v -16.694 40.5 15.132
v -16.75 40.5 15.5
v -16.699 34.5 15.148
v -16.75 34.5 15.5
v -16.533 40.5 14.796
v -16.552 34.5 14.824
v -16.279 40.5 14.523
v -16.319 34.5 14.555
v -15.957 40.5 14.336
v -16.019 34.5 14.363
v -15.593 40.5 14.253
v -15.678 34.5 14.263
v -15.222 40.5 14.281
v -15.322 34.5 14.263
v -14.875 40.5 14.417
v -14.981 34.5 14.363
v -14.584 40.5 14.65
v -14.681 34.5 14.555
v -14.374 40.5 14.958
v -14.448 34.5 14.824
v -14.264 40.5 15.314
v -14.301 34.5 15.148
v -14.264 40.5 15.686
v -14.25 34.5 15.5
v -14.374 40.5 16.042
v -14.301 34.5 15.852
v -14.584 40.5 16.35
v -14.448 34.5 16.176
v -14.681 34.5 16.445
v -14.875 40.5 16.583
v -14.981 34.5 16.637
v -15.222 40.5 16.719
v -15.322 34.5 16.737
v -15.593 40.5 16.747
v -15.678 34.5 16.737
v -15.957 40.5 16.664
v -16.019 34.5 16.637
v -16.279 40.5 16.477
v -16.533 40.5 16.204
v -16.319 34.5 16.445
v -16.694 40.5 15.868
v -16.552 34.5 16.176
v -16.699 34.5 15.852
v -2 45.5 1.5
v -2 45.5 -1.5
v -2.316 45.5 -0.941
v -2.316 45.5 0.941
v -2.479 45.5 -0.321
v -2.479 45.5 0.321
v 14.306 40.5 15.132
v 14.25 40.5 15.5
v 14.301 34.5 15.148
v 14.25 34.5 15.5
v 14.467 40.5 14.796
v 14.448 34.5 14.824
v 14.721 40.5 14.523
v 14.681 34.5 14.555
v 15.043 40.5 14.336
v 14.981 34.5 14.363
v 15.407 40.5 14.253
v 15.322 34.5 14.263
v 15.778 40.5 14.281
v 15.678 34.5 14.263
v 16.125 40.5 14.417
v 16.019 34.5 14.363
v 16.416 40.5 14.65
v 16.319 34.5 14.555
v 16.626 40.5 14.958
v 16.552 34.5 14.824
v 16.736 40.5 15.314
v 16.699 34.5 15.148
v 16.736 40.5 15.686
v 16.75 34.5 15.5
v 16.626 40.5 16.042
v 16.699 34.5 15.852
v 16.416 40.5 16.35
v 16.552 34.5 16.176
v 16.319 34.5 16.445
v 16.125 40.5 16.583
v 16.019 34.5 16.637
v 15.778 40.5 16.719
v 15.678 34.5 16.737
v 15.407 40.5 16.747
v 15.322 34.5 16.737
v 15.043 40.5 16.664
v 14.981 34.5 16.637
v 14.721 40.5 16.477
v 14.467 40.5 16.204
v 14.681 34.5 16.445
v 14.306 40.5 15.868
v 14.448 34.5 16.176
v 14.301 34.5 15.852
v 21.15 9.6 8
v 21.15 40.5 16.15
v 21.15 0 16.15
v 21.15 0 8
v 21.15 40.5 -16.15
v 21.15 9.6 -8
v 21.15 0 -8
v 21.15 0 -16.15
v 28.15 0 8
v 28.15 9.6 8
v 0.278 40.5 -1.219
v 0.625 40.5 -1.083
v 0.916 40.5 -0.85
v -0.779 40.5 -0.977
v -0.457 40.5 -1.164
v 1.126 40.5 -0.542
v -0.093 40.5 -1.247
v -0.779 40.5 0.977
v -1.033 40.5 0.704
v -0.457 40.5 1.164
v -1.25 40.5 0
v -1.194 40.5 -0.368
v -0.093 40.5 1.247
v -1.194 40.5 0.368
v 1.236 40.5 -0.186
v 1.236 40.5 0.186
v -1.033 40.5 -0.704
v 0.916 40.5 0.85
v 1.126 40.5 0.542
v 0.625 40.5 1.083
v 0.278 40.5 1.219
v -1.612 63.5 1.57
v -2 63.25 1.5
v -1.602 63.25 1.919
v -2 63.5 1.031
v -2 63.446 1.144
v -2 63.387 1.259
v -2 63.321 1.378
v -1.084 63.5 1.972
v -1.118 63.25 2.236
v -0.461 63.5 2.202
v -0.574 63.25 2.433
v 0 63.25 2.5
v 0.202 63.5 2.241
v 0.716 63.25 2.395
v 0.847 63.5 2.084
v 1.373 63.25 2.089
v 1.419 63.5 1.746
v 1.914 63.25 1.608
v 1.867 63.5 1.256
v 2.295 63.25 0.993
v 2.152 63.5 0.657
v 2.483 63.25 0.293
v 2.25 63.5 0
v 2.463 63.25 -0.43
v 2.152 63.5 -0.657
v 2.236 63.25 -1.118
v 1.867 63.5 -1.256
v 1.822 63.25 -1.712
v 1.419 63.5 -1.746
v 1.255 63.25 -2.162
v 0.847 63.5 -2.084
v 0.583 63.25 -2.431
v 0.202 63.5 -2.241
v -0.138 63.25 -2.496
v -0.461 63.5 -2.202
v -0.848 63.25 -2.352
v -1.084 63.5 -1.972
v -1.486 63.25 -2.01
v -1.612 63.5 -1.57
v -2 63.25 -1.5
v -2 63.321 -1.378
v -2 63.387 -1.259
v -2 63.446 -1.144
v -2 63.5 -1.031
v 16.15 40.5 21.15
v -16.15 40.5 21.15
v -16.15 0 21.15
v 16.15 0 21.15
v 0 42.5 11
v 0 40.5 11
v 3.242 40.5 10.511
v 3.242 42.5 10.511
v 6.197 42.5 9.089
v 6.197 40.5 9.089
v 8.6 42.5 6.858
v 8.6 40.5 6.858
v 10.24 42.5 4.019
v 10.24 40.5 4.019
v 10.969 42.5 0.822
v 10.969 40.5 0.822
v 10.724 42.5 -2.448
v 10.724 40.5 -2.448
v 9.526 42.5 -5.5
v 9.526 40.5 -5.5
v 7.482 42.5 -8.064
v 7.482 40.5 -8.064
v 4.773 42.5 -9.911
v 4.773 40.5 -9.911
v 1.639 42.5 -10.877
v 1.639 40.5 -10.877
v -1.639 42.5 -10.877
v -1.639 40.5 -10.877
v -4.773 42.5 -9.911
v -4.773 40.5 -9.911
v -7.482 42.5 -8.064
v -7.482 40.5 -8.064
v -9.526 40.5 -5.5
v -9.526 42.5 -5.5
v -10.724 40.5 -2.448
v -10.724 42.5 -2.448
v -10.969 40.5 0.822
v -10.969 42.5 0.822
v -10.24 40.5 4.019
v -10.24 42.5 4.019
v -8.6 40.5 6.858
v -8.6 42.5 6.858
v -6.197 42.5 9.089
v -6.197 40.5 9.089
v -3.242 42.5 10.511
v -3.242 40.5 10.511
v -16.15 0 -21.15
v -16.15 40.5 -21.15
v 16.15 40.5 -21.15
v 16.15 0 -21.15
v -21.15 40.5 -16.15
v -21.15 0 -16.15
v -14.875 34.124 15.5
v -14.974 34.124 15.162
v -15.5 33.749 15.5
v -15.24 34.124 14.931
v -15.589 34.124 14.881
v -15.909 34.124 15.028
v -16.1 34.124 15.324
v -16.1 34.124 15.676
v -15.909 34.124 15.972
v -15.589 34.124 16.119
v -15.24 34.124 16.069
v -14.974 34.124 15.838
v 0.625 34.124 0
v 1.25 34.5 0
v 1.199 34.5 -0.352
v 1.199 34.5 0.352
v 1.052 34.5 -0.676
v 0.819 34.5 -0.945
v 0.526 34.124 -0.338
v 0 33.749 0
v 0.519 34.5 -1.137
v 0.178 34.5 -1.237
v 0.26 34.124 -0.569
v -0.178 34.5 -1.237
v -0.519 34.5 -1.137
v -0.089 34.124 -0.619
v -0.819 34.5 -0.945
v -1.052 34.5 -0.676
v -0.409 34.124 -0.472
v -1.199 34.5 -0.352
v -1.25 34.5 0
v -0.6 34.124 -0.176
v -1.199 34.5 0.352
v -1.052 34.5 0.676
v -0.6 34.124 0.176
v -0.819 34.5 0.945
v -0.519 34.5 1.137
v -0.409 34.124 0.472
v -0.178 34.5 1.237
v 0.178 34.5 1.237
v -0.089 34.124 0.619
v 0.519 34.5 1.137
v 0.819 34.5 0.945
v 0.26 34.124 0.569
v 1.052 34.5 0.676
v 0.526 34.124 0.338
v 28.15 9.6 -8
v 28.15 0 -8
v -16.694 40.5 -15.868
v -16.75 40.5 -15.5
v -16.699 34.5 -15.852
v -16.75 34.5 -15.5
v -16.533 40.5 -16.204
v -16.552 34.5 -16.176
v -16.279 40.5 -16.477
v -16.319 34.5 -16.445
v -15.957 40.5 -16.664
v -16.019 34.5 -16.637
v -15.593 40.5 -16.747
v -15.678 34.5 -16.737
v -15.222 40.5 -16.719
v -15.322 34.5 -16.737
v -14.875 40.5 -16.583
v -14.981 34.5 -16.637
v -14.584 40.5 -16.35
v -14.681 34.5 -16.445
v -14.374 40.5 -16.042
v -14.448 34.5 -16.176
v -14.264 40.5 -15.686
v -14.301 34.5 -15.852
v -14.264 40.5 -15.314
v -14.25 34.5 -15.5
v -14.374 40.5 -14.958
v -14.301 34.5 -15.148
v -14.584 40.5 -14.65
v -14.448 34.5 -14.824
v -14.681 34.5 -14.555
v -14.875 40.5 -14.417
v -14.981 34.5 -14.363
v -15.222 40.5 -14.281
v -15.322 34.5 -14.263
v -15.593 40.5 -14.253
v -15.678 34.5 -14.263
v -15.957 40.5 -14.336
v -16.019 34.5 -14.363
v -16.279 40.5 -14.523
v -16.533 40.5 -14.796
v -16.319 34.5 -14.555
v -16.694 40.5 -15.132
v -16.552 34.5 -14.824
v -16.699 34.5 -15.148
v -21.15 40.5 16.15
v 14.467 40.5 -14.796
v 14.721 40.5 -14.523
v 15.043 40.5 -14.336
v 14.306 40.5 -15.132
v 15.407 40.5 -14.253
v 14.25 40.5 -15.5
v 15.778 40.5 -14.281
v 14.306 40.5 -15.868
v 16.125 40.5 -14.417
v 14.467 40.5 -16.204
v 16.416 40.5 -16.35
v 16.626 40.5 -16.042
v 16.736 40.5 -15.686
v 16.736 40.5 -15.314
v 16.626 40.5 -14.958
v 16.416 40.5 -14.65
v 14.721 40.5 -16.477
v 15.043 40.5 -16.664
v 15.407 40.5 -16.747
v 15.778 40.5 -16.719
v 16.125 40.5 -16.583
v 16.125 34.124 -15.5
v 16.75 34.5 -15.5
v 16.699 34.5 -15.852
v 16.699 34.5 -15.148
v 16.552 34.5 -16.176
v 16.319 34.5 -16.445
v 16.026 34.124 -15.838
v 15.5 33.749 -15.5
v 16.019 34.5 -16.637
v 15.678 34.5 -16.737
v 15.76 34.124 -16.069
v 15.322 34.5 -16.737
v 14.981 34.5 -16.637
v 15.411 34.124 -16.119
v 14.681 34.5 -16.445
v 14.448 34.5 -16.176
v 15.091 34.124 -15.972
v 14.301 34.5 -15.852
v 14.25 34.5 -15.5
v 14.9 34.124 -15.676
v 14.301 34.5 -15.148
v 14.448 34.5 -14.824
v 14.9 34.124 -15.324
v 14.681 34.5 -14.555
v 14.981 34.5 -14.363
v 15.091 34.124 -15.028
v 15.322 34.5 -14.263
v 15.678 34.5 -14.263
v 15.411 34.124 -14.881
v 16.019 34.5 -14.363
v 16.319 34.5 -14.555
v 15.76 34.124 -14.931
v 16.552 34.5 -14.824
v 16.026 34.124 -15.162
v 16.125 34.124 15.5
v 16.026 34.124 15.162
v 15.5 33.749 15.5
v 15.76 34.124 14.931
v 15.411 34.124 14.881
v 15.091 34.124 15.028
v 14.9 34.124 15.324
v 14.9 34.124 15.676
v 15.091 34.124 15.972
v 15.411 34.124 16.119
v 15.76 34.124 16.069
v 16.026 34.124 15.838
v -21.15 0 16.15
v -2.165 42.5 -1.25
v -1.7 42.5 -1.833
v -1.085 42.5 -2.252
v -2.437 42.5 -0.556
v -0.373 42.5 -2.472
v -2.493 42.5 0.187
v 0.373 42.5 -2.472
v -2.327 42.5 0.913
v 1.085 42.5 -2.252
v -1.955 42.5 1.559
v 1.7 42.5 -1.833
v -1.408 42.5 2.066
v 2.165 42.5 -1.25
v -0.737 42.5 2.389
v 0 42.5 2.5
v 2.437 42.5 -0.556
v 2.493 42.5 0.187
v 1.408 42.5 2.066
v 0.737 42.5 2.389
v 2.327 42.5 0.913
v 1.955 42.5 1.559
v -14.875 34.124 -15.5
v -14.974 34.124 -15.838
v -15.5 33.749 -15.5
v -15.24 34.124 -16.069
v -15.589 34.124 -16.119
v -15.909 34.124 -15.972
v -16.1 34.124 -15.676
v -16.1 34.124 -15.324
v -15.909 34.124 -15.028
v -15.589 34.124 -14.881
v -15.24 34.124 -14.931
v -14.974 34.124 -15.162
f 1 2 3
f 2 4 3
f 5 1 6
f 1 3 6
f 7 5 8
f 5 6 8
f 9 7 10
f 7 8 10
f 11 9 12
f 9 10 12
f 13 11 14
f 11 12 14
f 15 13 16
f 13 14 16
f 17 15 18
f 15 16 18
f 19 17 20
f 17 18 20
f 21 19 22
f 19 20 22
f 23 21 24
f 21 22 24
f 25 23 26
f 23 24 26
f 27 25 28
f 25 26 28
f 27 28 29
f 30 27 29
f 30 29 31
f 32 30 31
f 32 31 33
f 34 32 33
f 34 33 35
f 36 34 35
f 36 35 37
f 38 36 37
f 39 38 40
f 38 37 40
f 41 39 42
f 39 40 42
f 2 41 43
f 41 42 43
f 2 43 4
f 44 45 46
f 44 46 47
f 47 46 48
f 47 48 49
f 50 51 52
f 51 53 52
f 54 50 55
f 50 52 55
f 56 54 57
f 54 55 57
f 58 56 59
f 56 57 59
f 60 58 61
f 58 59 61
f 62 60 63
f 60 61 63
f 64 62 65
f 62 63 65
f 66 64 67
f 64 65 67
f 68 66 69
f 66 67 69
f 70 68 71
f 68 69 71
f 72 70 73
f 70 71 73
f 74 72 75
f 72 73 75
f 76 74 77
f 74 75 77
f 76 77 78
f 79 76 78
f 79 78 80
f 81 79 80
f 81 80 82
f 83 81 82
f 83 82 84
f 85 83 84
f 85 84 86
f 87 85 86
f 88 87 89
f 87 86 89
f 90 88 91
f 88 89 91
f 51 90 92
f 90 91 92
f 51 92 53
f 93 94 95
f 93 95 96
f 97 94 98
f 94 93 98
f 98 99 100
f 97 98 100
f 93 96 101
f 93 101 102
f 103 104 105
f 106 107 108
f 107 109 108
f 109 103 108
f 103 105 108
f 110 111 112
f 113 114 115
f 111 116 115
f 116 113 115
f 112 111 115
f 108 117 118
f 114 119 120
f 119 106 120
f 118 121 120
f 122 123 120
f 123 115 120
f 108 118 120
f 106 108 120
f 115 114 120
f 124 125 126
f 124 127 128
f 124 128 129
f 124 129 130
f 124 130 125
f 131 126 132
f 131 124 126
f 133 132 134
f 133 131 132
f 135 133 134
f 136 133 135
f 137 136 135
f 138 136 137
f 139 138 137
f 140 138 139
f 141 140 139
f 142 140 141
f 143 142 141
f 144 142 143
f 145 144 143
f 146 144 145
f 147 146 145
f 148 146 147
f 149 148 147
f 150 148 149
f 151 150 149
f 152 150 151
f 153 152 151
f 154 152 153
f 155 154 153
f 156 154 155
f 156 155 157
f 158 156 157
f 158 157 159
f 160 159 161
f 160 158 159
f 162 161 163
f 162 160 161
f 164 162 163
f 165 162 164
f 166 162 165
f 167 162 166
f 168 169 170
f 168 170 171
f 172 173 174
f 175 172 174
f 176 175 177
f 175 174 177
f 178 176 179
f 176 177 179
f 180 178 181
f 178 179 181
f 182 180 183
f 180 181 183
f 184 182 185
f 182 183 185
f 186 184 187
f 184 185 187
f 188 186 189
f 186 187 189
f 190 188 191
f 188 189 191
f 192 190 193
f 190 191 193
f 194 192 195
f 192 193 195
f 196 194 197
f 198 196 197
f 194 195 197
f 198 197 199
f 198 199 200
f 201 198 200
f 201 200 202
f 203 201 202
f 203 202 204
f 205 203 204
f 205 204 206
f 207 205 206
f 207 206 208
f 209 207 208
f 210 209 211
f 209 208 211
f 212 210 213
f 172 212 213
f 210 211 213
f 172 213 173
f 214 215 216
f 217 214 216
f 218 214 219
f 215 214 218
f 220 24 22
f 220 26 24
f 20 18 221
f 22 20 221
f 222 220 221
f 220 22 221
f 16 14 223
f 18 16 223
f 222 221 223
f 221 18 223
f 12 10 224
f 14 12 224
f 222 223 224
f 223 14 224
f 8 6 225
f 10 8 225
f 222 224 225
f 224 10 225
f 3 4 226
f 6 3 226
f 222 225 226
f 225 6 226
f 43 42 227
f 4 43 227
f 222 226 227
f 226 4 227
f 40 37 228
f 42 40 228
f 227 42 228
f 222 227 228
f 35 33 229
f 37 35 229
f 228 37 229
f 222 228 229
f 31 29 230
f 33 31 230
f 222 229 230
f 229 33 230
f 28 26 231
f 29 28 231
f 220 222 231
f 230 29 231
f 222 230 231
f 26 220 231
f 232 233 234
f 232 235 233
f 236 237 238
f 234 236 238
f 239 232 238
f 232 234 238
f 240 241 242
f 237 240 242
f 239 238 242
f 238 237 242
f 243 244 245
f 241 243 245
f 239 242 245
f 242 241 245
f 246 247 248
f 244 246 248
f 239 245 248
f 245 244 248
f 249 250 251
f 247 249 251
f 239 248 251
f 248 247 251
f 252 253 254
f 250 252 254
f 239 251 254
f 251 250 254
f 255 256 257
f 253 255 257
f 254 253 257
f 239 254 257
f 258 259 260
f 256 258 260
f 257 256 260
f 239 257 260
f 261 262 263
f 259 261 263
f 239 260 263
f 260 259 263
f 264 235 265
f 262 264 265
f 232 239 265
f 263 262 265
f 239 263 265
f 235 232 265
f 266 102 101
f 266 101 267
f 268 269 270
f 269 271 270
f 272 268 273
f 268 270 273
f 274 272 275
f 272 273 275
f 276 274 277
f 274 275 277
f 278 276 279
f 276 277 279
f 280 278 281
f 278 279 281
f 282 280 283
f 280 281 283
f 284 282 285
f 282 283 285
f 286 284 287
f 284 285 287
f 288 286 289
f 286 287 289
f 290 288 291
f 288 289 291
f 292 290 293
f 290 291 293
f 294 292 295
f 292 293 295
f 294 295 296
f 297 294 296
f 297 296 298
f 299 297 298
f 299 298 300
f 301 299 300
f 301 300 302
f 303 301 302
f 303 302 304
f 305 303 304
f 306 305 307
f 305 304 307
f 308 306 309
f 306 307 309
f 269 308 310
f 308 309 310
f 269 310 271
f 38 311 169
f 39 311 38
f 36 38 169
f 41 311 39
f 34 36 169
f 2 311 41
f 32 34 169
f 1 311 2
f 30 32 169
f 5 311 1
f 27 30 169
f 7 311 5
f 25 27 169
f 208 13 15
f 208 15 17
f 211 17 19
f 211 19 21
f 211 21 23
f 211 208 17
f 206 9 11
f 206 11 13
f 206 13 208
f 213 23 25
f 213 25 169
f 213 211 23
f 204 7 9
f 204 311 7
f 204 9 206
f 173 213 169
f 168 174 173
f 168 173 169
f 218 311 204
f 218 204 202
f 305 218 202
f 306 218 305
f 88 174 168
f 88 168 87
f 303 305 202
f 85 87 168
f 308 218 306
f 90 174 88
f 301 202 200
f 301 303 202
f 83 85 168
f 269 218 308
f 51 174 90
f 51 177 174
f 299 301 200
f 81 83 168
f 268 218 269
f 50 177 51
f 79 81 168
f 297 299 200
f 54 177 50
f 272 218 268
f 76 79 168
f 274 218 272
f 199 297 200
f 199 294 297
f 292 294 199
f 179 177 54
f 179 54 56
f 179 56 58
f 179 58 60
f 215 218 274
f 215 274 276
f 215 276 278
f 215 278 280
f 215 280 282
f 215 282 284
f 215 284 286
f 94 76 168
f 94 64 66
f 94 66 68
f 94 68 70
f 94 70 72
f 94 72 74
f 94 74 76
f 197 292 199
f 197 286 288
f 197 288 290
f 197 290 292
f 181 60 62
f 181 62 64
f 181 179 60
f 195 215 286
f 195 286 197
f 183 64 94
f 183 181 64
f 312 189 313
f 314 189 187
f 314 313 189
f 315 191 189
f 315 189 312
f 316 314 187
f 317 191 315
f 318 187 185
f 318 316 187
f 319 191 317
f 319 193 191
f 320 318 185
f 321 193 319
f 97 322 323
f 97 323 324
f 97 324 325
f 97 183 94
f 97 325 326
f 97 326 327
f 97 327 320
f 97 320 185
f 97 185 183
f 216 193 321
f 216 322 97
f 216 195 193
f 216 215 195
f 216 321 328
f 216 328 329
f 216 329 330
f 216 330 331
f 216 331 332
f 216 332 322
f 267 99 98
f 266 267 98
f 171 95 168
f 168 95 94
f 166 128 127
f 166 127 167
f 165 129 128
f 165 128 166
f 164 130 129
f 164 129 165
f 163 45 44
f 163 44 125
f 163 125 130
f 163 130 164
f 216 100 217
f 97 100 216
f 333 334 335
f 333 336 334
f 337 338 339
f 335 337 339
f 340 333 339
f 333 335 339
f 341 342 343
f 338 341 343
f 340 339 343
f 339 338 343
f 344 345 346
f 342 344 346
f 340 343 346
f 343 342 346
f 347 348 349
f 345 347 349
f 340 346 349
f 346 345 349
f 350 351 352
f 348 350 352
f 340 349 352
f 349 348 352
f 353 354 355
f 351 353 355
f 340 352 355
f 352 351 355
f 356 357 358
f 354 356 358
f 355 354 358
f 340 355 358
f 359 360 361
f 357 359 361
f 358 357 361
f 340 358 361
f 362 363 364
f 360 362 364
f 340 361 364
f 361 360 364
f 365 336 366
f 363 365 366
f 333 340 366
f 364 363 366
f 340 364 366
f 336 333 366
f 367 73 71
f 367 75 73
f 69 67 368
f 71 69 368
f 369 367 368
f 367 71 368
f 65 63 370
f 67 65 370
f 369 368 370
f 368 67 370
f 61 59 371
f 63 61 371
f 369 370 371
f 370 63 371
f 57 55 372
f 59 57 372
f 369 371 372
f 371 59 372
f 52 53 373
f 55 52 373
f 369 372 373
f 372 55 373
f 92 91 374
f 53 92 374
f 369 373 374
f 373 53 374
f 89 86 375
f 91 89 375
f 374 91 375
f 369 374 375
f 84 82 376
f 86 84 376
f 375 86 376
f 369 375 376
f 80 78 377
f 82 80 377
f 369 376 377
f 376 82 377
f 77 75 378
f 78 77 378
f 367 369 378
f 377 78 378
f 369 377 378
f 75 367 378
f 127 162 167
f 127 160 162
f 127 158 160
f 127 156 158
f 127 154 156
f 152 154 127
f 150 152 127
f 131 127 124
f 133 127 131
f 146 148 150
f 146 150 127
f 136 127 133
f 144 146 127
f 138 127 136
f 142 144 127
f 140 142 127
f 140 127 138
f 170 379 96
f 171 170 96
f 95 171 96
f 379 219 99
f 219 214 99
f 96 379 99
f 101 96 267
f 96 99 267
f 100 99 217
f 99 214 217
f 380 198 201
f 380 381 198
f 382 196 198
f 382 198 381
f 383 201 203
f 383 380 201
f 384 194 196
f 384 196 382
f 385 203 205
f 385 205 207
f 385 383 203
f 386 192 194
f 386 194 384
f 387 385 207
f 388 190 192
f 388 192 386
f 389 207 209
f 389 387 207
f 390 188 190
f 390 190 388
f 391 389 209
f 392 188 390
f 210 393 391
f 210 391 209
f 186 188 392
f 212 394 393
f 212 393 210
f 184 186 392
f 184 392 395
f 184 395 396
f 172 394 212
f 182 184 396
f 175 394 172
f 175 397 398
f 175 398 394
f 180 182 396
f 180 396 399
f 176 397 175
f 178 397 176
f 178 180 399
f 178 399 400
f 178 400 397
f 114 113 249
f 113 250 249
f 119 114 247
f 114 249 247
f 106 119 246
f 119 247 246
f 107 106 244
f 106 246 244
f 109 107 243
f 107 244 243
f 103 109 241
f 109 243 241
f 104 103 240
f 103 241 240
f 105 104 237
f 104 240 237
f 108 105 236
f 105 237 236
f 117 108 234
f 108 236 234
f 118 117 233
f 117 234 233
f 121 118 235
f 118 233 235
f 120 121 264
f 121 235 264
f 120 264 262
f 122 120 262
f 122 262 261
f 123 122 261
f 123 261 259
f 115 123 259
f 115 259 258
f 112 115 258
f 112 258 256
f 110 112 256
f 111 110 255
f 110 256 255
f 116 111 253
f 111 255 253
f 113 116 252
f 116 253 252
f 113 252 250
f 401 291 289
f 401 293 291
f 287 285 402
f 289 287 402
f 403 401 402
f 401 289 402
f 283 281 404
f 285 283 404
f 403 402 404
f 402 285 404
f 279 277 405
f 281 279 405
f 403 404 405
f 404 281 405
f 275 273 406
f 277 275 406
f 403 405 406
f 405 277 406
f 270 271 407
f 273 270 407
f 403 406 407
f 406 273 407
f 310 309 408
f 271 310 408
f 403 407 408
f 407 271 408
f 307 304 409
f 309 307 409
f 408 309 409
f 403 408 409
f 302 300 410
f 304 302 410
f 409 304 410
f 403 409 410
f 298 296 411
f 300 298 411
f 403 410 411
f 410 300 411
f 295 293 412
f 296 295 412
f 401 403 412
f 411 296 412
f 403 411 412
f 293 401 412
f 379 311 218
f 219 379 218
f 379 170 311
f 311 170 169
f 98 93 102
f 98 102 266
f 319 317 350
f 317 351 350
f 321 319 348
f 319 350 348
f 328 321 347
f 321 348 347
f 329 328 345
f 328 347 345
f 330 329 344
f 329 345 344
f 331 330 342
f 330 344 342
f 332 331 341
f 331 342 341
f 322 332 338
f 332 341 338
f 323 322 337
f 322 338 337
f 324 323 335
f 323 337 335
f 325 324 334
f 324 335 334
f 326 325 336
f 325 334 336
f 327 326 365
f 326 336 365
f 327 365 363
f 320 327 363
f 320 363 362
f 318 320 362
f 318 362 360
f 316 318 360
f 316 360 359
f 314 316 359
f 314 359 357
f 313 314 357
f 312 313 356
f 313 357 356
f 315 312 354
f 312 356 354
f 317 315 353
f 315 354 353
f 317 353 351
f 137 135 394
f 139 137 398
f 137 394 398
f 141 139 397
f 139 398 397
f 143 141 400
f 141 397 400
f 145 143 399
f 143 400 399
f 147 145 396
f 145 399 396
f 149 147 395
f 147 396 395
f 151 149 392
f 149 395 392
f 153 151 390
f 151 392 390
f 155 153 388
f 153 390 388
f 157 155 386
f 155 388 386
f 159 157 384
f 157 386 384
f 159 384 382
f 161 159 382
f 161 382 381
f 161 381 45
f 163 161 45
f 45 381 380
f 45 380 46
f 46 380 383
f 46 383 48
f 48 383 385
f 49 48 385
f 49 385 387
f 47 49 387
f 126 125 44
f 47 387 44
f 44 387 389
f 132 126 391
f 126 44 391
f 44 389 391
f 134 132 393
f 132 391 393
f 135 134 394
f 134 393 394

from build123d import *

# Parameters (mm, degrees)
SKETCH1_W                 = 42.3
SKETCH1_H                 = 42.3
BOSS_EXTRUDE1_DEPTH       = 40.5
M3X0_5_TAPPED_HOLE2_D     = 2.5
M3X0_5_TAPPED_HOLE2_DEPTH = 6
M3X0_5_TAPPED_HOLE2_TIP   = 0.751075774
CHAMFER1_SIZE             = 5
SKETCH2_R                 = 11
BOSS_EXTRUDE2_DEPTH       = 2
SKETCH3_R                 = 2.5
BOSS_EXTRUDE3_DEPTH       = 23
CHAMFER2_SIZE             = 0.25
CUT_EXTRUDE1_DEPTH        = 71.191844256
CUT_EXTRUDE1_DEPTH_BACK   = 71.191844256
SKETCH7_W                 = 0.5
SKETCH7_H                 = 18
SKETCH4_W                 = 16
SKETCH4_H                 = 9.6
BOSS_EXTRUDE4_DEPTH       = 7


with BuildPart() as part:
    # Sketch1 → Boss-Extrude1 (new body)
    with BuildSketch(Plane(origin=(0, 0, 0), x_dir=(1, 0, 0), z_dir=(0, 1, 0))):
        Rectangle(SKETCH1_W, SKETCH1_H)
    extrude(amount=BOSS_EXTRUDE1_DEPTH)

    # M3x0.5 Tapped Hole2
    with Locations(Plane(origin=(0, 40.5, 0), x_dir=(1, 0, 0), z_dir=(0, 1, 0))):
        with Locations((0, 0), (15.5, 15.5), (-15.5, -15.5), (-15.5, 15.5), (15.5, -15.5)):
            Hole(M3X0_5_TAPPED_HOLE2_D / 2, depth=M3X0_5_TAPPED_HOLE2_DEPTH)
            with Locations((0, 0, -(M3X0_5_TAPPED_HOLE2_DEPTH + M3X0_5_TAPPED_HOLE2_TIP / 2))):  # 118° drill point
                Cone(0, M3X0_5_TAPPED_HOLE2_D / 2, M3X0_5_TAPPED_HOLE2_TIP, mode=Mode.SUBTRACT)

    # Chamfer1
    chamfer1_edges = [part.edges().sort_by_distance(p)[0] for p in [
        (21.15, 20.25, 21.15),
        (-21.15, 20.25, 21.15),
        (-21.15, 20.25, -21.15),
        (21.15, 20.25, -21.15),
    ]]
    chamfer(chamfer1_edges, length=CHAMFER1_SIZE)

    # Sketch2 → Boss-Extrude2 (add)
    with BuildSketch(Plane(origin=(0, 40.5, 0), x_dir=(1, 0, 0), z_dir=(0, 1, 0))):
        with Locations(Location((0, 0, 0), (0, 0, 270))):
            Circle(SKETCH2_R)
    extrude(amount=BOSS_EXTRUDE2_DEPTH)

    # Sketch3 → Boss-Extrude3 (add)
    with BuildSketch(Plane(origin=(0, 40.5, 0), x_dir=(1, 0, 0), z_dir=(0, 1, 0))):
        with Locations(Location((0, 0, 0), (0, 0, 270))):
            Circle(SKETCH3_R)
    extrude(amount=BOSS_EXTRUDE3_DEPTH)

    # Chamfer2
    chamfer2_edges = [part.edges().sort_by_distance(p)[0] for p in [
        (0, 63.5, -2.5),
    ]]
    chamfer(chamfer2_edges, length=CHAMFER2_SIZE)

    # Sketch7 → Cut-Extrude1 (cut, two sides: drawn at the far end of the back side and taken through both)
    with BuildSketch(Plane.XY.offset(-CUT_EXTRUDE1_DEPTH_BACK)):
        with Locations((-2.25, 54.5)):
            Rectangle(SKETCH7_W, SKETCH7_H)
    extrude(amount=CUT_EXTRUDE1_DEPTH + CUT_EXTRUDE1_DEPTH_BACK, mode=Mode.SUBTRACT)

    # Sketch4 → Boss-Extrude4 (add)
    with BuildSketch(Plane(origin=(21.15, 0, 0), x_dir=(0, 0, -1), z_dir=(1, 0, 0))):
        with Locations((0, 4.8)):
            Rectangle(SKETCH4_W, SKETCH4_H)
    extrude(amount=BOSS_EXTRUDE4_DEPTH)


solid = part.part
